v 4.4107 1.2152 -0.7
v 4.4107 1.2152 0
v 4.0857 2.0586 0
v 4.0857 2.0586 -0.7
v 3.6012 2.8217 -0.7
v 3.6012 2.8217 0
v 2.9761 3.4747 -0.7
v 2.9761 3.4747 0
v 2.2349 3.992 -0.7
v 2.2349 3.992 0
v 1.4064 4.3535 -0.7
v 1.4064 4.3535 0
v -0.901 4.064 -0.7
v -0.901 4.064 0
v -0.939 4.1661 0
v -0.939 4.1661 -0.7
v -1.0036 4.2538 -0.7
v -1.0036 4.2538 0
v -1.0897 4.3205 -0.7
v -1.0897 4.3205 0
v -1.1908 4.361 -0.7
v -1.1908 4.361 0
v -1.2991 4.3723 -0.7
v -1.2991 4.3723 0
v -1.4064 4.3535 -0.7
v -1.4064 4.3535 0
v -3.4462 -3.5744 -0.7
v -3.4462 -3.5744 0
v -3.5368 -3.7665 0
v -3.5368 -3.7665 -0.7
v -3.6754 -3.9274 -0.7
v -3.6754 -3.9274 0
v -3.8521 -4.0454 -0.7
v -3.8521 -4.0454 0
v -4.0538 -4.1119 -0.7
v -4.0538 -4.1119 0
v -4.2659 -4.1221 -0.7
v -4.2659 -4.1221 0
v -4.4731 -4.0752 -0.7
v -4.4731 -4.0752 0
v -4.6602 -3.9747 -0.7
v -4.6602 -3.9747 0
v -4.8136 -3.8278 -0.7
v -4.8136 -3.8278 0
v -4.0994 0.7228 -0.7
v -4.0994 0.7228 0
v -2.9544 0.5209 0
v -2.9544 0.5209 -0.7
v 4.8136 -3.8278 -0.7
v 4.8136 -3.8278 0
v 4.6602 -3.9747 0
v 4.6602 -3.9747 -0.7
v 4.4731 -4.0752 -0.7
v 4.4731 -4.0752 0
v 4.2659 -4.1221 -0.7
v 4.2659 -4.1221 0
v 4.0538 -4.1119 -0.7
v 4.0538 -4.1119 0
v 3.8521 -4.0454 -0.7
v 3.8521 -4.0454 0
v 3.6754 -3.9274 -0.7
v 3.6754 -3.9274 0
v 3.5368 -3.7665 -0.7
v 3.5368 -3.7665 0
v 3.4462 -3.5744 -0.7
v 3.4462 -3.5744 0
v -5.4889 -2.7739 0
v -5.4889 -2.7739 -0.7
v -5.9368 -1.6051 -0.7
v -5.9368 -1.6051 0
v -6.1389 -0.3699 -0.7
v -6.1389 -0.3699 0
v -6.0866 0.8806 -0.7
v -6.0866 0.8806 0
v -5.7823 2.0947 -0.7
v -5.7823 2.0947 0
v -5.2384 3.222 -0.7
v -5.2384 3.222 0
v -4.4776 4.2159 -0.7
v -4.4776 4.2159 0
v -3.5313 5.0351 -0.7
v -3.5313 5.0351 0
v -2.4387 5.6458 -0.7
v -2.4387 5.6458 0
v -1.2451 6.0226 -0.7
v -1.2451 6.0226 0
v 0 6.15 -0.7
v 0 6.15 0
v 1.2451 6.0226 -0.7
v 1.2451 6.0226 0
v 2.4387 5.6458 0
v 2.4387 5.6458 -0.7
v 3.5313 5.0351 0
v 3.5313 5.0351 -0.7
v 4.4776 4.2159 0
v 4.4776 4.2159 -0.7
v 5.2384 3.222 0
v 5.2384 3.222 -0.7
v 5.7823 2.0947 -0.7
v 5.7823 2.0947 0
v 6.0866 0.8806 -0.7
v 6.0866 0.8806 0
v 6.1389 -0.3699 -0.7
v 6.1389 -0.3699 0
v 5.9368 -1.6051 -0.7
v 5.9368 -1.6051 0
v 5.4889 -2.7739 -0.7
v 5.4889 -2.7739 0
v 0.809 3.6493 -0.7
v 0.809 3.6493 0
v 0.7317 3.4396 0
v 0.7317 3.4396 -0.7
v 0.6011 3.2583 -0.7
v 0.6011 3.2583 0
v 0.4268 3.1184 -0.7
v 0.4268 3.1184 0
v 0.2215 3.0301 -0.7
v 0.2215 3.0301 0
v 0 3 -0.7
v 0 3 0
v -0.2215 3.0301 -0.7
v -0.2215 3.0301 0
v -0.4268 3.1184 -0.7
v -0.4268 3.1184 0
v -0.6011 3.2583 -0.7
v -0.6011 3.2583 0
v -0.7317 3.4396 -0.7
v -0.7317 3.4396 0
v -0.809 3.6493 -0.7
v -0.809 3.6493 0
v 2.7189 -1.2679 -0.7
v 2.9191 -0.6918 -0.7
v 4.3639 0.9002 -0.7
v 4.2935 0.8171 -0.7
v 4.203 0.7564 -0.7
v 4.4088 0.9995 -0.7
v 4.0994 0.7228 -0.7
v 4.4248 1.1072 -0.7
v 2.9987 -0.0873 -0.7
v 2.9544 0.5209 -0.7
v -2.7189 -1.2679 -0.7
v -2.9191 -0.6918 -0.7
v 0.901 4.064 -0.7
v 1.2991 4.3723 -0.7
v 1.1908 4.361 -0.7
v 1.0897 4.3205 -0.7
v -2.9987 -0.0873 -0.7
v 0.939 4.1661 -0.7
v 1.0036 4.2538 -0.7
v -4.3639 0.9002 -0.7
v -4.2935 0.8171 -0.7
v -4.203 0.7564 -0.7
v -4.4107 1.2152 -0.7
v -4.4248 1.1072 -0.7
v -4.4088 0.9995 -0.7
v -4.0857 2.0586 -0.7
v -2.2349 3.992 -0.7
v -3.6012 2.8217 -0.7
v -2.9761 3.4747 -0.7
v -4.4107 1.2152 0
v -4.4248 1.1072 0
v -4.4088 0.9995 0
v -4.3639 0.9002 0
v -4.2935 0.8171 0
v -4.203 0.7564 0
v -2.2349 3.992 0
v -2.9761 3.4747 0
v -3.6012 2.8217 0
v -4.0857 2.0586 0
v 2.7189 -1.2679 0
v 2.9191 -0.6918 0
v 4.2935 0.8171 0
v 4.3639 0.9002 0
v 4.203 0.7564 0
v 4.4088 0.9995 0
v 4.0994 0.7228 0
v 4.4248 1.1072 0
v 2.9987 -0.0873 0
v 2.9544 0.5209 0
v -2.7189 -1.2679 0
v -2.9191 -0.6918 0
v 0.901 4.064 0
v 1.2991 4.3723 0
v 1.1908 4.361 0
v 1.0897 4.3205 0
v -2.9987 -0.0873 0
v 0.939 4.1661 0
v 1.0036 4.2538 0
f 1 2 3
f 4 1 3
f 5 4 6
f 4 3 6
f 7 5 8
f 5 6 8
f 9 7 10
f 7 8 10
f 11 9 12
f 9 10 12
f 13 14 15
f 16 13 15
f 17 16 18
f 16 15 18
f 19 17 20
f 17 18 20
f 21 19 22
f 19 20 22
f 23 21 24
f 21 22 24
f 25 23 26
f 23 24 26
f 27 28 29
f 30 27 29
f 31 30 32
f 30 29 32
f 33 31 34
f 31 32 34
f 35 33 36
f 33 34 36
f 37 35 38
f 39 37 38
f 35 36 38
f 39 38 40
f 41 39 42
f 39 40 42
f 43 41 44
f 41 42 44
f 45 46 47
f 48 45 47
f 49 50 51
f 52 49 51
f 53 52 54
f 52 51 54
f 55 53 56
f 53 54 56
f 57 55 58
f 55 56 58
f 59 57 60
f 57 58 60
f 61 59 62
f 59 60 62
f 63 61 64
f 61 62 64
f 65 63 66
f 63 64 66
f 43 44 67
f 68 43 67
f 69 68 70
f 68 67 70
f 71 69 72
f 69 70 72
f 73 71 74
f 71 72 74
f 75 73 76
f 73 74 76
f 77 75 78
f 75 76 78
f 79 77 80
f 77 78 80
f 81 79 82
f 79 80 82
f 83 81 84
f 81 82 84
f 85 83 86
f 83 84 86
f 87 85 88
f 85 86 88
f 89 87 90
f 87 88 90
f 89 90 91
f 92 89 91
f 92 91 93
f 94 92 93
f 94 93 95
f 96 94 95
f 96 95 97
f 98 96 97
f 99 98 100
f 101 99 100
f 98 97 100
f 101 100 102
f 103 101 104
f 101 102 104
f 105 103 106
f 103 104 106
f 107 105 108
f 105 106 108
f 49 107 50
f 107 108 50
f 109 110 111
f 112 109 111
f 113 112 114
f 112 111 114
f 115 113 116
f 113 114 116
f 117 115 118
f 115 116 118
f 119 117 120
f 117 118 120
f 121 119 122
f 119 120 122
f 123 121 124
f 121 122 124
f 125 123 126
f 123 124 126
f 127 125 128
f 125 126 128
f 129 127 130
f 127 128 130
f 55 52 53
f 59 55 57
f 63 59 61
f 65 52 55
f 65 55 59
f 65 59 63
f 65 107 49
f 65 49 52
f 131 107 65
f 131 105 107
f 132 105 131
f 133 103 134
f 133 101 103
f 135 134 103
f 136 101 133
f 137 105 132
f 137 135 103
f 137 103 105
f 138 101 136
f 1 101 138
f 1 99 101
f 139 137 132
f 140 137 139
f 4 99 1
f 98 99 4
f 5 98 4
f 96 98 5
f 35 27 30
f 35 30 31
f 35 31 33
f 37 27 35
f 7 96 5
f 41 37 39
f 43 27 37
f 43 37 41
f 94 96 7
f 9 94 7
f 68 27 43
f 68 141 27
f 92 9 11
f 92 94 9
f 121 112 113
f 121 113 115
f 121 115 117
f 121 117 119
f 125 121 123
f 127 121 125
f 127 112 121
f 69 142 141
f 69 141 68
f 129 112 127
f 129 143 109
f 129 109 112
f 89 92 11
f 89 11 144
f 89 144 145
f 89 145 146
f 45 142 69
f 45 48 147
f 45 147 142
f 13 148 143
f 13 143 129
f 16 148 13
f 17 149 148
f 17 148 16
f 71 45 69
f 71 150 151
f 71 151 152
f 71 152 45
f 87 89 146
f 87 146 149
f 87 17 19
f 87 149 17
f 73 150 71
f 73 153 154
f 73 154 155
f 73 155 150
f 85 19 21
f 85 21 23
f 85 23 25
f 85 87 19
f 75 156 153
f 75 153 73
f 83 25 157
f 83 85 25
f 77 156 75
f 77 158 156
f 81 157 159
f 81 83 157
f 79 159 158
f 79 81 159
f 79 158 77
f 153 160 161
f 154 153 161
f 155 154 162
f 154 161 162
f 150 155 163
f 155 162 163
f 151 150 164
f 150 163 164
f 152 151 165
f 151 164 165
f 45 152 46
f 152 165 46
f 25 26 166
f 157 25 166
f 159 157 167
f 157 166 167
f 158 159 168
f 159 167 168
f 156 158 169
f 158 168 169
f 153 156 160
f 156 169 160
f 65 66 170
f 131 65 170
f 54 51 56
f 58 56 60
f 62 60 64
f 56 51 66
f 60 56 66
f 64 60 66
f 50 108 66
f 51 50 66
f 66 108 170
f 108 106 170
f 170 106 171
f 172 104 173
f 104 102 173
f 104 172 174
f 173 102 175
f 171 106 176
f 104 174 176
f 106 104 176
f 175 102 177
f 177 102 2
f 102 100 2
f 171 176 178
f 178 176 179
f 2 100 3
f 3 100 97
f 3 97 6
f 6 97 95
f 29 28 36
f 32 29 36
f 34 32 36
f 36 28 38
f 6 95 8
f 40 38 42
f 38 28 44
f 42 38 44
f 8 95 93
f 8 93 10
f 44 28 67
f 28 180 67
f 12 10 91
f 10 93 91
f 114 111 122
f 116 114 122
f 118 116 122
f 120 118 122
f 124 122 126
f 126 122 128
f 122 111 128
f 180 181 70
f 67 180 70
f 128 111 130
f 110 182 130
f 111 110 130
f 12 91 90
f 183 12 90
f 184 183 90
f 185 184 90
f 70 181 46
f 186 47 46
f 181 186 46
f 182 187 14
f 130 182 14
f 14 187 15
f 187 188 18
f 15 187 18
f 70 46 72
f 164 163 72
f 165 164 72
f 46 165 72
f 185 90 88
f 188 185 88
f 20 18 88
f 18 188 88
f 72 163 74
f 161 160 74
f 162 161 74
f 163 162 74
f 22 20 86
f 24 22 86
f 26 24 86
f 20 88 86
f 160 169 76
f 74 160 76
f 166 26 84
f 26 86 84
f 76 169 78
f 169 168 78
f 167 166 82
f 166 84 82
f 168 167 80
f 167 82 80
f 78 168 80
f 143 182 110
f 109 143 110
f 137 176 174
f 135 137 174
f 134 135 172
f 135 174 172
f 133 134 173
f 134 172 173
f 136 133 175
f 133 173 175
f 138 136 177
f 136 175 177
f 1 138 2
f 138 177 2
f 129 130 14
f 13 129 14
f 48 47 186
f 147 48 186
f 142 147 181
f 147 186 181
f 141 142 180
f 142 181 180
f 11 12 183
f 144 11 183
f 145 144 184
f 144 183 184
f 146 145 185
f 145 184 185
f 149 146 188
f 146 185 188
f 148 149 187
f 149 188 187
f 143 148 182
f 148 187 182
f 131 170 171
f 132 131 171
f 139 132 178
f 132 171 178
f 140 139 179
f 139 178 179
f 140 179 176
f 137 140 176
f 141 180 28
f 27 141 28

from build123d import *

# Parameters (mm, degrees)
BODY_DEPTH = 0.7


with BuildPart() as part:
    # BodySke → Body (new body)
    with BuildSketch(Plane.XY):
        with BuildLine():
            Line((2.954423259, 0.520944533), (4.099428621, 0.722839871))
            ThreePointArc((4.099428621, 0.722839871), (4.363883059, 0.900217065), (4.410660695, 1.215194321))
            ThreePointArc((4.410660695, 1.215194321), (3.304815126, 3.16367223), (1.406428042, 4.353456691))
            ThreePointArc((1.406428042, 4.353456691), (1.089710164, 4.320462692), (0.900966453, 4.063997041))
            Line((0.900966453, 4.063997041), (0.80903451, 3.649318842))
            ThreePointArc((0.80903451, 3.649318842), (0, 3), (-0.80903451, 3.649318842))
            Line((-0.80903451, 3.649318842), (-0.900966453, 4.063997041))
            ThreePointArc((-0.900966453, 4.063997041), (-1.089710164, 4.320462692), (-1.406428042, 4.353456691))
            ThreePointArc((-1.406428042, 4.353456691), (-3.304815126, 3.16367223), (-4.410660695, 1.215194321))
            ThreePointArc((-4.410660695, 1.215194321), (-4.363883059, 0.900217065), (-4.099428621, 0.722839871))
            Line((-4.099428621, 0.722839871), (-2.954423259, 0.520944533))
            ThreePointArc((-2.954423259, 0.520944533), (-2.974334584, -0.391578577), (-2.718923361, -1.267854785))
            Line((-2.718923361, -1.267854785), (-3.446179756, -3.574417389))
            ThreePointArc((-3.446179756, -3.574417389), (-4.053778864, -4.111935463), (-4.813608561, -3.827750334))
            ThreePointArc((-4.813608561, -3.827750334), (0, 6.15), (4.813608561, -3.827750334))
            ThreePointArc((4.813608561, -3.827750334), (4.053778864, -4.111935463), (3.446179756, -3.574417389))
            Line((3.446179756, -3.574417389), (2.718923361, -1.267854785))
            ThreePointArc((2.718923361, -1.267854785), (2.974334584, -0.391578577), (2.954423259, 0.520944533))
        make_face()
    extrude(amount=-BODY_DEPTH)


solid = part.part
